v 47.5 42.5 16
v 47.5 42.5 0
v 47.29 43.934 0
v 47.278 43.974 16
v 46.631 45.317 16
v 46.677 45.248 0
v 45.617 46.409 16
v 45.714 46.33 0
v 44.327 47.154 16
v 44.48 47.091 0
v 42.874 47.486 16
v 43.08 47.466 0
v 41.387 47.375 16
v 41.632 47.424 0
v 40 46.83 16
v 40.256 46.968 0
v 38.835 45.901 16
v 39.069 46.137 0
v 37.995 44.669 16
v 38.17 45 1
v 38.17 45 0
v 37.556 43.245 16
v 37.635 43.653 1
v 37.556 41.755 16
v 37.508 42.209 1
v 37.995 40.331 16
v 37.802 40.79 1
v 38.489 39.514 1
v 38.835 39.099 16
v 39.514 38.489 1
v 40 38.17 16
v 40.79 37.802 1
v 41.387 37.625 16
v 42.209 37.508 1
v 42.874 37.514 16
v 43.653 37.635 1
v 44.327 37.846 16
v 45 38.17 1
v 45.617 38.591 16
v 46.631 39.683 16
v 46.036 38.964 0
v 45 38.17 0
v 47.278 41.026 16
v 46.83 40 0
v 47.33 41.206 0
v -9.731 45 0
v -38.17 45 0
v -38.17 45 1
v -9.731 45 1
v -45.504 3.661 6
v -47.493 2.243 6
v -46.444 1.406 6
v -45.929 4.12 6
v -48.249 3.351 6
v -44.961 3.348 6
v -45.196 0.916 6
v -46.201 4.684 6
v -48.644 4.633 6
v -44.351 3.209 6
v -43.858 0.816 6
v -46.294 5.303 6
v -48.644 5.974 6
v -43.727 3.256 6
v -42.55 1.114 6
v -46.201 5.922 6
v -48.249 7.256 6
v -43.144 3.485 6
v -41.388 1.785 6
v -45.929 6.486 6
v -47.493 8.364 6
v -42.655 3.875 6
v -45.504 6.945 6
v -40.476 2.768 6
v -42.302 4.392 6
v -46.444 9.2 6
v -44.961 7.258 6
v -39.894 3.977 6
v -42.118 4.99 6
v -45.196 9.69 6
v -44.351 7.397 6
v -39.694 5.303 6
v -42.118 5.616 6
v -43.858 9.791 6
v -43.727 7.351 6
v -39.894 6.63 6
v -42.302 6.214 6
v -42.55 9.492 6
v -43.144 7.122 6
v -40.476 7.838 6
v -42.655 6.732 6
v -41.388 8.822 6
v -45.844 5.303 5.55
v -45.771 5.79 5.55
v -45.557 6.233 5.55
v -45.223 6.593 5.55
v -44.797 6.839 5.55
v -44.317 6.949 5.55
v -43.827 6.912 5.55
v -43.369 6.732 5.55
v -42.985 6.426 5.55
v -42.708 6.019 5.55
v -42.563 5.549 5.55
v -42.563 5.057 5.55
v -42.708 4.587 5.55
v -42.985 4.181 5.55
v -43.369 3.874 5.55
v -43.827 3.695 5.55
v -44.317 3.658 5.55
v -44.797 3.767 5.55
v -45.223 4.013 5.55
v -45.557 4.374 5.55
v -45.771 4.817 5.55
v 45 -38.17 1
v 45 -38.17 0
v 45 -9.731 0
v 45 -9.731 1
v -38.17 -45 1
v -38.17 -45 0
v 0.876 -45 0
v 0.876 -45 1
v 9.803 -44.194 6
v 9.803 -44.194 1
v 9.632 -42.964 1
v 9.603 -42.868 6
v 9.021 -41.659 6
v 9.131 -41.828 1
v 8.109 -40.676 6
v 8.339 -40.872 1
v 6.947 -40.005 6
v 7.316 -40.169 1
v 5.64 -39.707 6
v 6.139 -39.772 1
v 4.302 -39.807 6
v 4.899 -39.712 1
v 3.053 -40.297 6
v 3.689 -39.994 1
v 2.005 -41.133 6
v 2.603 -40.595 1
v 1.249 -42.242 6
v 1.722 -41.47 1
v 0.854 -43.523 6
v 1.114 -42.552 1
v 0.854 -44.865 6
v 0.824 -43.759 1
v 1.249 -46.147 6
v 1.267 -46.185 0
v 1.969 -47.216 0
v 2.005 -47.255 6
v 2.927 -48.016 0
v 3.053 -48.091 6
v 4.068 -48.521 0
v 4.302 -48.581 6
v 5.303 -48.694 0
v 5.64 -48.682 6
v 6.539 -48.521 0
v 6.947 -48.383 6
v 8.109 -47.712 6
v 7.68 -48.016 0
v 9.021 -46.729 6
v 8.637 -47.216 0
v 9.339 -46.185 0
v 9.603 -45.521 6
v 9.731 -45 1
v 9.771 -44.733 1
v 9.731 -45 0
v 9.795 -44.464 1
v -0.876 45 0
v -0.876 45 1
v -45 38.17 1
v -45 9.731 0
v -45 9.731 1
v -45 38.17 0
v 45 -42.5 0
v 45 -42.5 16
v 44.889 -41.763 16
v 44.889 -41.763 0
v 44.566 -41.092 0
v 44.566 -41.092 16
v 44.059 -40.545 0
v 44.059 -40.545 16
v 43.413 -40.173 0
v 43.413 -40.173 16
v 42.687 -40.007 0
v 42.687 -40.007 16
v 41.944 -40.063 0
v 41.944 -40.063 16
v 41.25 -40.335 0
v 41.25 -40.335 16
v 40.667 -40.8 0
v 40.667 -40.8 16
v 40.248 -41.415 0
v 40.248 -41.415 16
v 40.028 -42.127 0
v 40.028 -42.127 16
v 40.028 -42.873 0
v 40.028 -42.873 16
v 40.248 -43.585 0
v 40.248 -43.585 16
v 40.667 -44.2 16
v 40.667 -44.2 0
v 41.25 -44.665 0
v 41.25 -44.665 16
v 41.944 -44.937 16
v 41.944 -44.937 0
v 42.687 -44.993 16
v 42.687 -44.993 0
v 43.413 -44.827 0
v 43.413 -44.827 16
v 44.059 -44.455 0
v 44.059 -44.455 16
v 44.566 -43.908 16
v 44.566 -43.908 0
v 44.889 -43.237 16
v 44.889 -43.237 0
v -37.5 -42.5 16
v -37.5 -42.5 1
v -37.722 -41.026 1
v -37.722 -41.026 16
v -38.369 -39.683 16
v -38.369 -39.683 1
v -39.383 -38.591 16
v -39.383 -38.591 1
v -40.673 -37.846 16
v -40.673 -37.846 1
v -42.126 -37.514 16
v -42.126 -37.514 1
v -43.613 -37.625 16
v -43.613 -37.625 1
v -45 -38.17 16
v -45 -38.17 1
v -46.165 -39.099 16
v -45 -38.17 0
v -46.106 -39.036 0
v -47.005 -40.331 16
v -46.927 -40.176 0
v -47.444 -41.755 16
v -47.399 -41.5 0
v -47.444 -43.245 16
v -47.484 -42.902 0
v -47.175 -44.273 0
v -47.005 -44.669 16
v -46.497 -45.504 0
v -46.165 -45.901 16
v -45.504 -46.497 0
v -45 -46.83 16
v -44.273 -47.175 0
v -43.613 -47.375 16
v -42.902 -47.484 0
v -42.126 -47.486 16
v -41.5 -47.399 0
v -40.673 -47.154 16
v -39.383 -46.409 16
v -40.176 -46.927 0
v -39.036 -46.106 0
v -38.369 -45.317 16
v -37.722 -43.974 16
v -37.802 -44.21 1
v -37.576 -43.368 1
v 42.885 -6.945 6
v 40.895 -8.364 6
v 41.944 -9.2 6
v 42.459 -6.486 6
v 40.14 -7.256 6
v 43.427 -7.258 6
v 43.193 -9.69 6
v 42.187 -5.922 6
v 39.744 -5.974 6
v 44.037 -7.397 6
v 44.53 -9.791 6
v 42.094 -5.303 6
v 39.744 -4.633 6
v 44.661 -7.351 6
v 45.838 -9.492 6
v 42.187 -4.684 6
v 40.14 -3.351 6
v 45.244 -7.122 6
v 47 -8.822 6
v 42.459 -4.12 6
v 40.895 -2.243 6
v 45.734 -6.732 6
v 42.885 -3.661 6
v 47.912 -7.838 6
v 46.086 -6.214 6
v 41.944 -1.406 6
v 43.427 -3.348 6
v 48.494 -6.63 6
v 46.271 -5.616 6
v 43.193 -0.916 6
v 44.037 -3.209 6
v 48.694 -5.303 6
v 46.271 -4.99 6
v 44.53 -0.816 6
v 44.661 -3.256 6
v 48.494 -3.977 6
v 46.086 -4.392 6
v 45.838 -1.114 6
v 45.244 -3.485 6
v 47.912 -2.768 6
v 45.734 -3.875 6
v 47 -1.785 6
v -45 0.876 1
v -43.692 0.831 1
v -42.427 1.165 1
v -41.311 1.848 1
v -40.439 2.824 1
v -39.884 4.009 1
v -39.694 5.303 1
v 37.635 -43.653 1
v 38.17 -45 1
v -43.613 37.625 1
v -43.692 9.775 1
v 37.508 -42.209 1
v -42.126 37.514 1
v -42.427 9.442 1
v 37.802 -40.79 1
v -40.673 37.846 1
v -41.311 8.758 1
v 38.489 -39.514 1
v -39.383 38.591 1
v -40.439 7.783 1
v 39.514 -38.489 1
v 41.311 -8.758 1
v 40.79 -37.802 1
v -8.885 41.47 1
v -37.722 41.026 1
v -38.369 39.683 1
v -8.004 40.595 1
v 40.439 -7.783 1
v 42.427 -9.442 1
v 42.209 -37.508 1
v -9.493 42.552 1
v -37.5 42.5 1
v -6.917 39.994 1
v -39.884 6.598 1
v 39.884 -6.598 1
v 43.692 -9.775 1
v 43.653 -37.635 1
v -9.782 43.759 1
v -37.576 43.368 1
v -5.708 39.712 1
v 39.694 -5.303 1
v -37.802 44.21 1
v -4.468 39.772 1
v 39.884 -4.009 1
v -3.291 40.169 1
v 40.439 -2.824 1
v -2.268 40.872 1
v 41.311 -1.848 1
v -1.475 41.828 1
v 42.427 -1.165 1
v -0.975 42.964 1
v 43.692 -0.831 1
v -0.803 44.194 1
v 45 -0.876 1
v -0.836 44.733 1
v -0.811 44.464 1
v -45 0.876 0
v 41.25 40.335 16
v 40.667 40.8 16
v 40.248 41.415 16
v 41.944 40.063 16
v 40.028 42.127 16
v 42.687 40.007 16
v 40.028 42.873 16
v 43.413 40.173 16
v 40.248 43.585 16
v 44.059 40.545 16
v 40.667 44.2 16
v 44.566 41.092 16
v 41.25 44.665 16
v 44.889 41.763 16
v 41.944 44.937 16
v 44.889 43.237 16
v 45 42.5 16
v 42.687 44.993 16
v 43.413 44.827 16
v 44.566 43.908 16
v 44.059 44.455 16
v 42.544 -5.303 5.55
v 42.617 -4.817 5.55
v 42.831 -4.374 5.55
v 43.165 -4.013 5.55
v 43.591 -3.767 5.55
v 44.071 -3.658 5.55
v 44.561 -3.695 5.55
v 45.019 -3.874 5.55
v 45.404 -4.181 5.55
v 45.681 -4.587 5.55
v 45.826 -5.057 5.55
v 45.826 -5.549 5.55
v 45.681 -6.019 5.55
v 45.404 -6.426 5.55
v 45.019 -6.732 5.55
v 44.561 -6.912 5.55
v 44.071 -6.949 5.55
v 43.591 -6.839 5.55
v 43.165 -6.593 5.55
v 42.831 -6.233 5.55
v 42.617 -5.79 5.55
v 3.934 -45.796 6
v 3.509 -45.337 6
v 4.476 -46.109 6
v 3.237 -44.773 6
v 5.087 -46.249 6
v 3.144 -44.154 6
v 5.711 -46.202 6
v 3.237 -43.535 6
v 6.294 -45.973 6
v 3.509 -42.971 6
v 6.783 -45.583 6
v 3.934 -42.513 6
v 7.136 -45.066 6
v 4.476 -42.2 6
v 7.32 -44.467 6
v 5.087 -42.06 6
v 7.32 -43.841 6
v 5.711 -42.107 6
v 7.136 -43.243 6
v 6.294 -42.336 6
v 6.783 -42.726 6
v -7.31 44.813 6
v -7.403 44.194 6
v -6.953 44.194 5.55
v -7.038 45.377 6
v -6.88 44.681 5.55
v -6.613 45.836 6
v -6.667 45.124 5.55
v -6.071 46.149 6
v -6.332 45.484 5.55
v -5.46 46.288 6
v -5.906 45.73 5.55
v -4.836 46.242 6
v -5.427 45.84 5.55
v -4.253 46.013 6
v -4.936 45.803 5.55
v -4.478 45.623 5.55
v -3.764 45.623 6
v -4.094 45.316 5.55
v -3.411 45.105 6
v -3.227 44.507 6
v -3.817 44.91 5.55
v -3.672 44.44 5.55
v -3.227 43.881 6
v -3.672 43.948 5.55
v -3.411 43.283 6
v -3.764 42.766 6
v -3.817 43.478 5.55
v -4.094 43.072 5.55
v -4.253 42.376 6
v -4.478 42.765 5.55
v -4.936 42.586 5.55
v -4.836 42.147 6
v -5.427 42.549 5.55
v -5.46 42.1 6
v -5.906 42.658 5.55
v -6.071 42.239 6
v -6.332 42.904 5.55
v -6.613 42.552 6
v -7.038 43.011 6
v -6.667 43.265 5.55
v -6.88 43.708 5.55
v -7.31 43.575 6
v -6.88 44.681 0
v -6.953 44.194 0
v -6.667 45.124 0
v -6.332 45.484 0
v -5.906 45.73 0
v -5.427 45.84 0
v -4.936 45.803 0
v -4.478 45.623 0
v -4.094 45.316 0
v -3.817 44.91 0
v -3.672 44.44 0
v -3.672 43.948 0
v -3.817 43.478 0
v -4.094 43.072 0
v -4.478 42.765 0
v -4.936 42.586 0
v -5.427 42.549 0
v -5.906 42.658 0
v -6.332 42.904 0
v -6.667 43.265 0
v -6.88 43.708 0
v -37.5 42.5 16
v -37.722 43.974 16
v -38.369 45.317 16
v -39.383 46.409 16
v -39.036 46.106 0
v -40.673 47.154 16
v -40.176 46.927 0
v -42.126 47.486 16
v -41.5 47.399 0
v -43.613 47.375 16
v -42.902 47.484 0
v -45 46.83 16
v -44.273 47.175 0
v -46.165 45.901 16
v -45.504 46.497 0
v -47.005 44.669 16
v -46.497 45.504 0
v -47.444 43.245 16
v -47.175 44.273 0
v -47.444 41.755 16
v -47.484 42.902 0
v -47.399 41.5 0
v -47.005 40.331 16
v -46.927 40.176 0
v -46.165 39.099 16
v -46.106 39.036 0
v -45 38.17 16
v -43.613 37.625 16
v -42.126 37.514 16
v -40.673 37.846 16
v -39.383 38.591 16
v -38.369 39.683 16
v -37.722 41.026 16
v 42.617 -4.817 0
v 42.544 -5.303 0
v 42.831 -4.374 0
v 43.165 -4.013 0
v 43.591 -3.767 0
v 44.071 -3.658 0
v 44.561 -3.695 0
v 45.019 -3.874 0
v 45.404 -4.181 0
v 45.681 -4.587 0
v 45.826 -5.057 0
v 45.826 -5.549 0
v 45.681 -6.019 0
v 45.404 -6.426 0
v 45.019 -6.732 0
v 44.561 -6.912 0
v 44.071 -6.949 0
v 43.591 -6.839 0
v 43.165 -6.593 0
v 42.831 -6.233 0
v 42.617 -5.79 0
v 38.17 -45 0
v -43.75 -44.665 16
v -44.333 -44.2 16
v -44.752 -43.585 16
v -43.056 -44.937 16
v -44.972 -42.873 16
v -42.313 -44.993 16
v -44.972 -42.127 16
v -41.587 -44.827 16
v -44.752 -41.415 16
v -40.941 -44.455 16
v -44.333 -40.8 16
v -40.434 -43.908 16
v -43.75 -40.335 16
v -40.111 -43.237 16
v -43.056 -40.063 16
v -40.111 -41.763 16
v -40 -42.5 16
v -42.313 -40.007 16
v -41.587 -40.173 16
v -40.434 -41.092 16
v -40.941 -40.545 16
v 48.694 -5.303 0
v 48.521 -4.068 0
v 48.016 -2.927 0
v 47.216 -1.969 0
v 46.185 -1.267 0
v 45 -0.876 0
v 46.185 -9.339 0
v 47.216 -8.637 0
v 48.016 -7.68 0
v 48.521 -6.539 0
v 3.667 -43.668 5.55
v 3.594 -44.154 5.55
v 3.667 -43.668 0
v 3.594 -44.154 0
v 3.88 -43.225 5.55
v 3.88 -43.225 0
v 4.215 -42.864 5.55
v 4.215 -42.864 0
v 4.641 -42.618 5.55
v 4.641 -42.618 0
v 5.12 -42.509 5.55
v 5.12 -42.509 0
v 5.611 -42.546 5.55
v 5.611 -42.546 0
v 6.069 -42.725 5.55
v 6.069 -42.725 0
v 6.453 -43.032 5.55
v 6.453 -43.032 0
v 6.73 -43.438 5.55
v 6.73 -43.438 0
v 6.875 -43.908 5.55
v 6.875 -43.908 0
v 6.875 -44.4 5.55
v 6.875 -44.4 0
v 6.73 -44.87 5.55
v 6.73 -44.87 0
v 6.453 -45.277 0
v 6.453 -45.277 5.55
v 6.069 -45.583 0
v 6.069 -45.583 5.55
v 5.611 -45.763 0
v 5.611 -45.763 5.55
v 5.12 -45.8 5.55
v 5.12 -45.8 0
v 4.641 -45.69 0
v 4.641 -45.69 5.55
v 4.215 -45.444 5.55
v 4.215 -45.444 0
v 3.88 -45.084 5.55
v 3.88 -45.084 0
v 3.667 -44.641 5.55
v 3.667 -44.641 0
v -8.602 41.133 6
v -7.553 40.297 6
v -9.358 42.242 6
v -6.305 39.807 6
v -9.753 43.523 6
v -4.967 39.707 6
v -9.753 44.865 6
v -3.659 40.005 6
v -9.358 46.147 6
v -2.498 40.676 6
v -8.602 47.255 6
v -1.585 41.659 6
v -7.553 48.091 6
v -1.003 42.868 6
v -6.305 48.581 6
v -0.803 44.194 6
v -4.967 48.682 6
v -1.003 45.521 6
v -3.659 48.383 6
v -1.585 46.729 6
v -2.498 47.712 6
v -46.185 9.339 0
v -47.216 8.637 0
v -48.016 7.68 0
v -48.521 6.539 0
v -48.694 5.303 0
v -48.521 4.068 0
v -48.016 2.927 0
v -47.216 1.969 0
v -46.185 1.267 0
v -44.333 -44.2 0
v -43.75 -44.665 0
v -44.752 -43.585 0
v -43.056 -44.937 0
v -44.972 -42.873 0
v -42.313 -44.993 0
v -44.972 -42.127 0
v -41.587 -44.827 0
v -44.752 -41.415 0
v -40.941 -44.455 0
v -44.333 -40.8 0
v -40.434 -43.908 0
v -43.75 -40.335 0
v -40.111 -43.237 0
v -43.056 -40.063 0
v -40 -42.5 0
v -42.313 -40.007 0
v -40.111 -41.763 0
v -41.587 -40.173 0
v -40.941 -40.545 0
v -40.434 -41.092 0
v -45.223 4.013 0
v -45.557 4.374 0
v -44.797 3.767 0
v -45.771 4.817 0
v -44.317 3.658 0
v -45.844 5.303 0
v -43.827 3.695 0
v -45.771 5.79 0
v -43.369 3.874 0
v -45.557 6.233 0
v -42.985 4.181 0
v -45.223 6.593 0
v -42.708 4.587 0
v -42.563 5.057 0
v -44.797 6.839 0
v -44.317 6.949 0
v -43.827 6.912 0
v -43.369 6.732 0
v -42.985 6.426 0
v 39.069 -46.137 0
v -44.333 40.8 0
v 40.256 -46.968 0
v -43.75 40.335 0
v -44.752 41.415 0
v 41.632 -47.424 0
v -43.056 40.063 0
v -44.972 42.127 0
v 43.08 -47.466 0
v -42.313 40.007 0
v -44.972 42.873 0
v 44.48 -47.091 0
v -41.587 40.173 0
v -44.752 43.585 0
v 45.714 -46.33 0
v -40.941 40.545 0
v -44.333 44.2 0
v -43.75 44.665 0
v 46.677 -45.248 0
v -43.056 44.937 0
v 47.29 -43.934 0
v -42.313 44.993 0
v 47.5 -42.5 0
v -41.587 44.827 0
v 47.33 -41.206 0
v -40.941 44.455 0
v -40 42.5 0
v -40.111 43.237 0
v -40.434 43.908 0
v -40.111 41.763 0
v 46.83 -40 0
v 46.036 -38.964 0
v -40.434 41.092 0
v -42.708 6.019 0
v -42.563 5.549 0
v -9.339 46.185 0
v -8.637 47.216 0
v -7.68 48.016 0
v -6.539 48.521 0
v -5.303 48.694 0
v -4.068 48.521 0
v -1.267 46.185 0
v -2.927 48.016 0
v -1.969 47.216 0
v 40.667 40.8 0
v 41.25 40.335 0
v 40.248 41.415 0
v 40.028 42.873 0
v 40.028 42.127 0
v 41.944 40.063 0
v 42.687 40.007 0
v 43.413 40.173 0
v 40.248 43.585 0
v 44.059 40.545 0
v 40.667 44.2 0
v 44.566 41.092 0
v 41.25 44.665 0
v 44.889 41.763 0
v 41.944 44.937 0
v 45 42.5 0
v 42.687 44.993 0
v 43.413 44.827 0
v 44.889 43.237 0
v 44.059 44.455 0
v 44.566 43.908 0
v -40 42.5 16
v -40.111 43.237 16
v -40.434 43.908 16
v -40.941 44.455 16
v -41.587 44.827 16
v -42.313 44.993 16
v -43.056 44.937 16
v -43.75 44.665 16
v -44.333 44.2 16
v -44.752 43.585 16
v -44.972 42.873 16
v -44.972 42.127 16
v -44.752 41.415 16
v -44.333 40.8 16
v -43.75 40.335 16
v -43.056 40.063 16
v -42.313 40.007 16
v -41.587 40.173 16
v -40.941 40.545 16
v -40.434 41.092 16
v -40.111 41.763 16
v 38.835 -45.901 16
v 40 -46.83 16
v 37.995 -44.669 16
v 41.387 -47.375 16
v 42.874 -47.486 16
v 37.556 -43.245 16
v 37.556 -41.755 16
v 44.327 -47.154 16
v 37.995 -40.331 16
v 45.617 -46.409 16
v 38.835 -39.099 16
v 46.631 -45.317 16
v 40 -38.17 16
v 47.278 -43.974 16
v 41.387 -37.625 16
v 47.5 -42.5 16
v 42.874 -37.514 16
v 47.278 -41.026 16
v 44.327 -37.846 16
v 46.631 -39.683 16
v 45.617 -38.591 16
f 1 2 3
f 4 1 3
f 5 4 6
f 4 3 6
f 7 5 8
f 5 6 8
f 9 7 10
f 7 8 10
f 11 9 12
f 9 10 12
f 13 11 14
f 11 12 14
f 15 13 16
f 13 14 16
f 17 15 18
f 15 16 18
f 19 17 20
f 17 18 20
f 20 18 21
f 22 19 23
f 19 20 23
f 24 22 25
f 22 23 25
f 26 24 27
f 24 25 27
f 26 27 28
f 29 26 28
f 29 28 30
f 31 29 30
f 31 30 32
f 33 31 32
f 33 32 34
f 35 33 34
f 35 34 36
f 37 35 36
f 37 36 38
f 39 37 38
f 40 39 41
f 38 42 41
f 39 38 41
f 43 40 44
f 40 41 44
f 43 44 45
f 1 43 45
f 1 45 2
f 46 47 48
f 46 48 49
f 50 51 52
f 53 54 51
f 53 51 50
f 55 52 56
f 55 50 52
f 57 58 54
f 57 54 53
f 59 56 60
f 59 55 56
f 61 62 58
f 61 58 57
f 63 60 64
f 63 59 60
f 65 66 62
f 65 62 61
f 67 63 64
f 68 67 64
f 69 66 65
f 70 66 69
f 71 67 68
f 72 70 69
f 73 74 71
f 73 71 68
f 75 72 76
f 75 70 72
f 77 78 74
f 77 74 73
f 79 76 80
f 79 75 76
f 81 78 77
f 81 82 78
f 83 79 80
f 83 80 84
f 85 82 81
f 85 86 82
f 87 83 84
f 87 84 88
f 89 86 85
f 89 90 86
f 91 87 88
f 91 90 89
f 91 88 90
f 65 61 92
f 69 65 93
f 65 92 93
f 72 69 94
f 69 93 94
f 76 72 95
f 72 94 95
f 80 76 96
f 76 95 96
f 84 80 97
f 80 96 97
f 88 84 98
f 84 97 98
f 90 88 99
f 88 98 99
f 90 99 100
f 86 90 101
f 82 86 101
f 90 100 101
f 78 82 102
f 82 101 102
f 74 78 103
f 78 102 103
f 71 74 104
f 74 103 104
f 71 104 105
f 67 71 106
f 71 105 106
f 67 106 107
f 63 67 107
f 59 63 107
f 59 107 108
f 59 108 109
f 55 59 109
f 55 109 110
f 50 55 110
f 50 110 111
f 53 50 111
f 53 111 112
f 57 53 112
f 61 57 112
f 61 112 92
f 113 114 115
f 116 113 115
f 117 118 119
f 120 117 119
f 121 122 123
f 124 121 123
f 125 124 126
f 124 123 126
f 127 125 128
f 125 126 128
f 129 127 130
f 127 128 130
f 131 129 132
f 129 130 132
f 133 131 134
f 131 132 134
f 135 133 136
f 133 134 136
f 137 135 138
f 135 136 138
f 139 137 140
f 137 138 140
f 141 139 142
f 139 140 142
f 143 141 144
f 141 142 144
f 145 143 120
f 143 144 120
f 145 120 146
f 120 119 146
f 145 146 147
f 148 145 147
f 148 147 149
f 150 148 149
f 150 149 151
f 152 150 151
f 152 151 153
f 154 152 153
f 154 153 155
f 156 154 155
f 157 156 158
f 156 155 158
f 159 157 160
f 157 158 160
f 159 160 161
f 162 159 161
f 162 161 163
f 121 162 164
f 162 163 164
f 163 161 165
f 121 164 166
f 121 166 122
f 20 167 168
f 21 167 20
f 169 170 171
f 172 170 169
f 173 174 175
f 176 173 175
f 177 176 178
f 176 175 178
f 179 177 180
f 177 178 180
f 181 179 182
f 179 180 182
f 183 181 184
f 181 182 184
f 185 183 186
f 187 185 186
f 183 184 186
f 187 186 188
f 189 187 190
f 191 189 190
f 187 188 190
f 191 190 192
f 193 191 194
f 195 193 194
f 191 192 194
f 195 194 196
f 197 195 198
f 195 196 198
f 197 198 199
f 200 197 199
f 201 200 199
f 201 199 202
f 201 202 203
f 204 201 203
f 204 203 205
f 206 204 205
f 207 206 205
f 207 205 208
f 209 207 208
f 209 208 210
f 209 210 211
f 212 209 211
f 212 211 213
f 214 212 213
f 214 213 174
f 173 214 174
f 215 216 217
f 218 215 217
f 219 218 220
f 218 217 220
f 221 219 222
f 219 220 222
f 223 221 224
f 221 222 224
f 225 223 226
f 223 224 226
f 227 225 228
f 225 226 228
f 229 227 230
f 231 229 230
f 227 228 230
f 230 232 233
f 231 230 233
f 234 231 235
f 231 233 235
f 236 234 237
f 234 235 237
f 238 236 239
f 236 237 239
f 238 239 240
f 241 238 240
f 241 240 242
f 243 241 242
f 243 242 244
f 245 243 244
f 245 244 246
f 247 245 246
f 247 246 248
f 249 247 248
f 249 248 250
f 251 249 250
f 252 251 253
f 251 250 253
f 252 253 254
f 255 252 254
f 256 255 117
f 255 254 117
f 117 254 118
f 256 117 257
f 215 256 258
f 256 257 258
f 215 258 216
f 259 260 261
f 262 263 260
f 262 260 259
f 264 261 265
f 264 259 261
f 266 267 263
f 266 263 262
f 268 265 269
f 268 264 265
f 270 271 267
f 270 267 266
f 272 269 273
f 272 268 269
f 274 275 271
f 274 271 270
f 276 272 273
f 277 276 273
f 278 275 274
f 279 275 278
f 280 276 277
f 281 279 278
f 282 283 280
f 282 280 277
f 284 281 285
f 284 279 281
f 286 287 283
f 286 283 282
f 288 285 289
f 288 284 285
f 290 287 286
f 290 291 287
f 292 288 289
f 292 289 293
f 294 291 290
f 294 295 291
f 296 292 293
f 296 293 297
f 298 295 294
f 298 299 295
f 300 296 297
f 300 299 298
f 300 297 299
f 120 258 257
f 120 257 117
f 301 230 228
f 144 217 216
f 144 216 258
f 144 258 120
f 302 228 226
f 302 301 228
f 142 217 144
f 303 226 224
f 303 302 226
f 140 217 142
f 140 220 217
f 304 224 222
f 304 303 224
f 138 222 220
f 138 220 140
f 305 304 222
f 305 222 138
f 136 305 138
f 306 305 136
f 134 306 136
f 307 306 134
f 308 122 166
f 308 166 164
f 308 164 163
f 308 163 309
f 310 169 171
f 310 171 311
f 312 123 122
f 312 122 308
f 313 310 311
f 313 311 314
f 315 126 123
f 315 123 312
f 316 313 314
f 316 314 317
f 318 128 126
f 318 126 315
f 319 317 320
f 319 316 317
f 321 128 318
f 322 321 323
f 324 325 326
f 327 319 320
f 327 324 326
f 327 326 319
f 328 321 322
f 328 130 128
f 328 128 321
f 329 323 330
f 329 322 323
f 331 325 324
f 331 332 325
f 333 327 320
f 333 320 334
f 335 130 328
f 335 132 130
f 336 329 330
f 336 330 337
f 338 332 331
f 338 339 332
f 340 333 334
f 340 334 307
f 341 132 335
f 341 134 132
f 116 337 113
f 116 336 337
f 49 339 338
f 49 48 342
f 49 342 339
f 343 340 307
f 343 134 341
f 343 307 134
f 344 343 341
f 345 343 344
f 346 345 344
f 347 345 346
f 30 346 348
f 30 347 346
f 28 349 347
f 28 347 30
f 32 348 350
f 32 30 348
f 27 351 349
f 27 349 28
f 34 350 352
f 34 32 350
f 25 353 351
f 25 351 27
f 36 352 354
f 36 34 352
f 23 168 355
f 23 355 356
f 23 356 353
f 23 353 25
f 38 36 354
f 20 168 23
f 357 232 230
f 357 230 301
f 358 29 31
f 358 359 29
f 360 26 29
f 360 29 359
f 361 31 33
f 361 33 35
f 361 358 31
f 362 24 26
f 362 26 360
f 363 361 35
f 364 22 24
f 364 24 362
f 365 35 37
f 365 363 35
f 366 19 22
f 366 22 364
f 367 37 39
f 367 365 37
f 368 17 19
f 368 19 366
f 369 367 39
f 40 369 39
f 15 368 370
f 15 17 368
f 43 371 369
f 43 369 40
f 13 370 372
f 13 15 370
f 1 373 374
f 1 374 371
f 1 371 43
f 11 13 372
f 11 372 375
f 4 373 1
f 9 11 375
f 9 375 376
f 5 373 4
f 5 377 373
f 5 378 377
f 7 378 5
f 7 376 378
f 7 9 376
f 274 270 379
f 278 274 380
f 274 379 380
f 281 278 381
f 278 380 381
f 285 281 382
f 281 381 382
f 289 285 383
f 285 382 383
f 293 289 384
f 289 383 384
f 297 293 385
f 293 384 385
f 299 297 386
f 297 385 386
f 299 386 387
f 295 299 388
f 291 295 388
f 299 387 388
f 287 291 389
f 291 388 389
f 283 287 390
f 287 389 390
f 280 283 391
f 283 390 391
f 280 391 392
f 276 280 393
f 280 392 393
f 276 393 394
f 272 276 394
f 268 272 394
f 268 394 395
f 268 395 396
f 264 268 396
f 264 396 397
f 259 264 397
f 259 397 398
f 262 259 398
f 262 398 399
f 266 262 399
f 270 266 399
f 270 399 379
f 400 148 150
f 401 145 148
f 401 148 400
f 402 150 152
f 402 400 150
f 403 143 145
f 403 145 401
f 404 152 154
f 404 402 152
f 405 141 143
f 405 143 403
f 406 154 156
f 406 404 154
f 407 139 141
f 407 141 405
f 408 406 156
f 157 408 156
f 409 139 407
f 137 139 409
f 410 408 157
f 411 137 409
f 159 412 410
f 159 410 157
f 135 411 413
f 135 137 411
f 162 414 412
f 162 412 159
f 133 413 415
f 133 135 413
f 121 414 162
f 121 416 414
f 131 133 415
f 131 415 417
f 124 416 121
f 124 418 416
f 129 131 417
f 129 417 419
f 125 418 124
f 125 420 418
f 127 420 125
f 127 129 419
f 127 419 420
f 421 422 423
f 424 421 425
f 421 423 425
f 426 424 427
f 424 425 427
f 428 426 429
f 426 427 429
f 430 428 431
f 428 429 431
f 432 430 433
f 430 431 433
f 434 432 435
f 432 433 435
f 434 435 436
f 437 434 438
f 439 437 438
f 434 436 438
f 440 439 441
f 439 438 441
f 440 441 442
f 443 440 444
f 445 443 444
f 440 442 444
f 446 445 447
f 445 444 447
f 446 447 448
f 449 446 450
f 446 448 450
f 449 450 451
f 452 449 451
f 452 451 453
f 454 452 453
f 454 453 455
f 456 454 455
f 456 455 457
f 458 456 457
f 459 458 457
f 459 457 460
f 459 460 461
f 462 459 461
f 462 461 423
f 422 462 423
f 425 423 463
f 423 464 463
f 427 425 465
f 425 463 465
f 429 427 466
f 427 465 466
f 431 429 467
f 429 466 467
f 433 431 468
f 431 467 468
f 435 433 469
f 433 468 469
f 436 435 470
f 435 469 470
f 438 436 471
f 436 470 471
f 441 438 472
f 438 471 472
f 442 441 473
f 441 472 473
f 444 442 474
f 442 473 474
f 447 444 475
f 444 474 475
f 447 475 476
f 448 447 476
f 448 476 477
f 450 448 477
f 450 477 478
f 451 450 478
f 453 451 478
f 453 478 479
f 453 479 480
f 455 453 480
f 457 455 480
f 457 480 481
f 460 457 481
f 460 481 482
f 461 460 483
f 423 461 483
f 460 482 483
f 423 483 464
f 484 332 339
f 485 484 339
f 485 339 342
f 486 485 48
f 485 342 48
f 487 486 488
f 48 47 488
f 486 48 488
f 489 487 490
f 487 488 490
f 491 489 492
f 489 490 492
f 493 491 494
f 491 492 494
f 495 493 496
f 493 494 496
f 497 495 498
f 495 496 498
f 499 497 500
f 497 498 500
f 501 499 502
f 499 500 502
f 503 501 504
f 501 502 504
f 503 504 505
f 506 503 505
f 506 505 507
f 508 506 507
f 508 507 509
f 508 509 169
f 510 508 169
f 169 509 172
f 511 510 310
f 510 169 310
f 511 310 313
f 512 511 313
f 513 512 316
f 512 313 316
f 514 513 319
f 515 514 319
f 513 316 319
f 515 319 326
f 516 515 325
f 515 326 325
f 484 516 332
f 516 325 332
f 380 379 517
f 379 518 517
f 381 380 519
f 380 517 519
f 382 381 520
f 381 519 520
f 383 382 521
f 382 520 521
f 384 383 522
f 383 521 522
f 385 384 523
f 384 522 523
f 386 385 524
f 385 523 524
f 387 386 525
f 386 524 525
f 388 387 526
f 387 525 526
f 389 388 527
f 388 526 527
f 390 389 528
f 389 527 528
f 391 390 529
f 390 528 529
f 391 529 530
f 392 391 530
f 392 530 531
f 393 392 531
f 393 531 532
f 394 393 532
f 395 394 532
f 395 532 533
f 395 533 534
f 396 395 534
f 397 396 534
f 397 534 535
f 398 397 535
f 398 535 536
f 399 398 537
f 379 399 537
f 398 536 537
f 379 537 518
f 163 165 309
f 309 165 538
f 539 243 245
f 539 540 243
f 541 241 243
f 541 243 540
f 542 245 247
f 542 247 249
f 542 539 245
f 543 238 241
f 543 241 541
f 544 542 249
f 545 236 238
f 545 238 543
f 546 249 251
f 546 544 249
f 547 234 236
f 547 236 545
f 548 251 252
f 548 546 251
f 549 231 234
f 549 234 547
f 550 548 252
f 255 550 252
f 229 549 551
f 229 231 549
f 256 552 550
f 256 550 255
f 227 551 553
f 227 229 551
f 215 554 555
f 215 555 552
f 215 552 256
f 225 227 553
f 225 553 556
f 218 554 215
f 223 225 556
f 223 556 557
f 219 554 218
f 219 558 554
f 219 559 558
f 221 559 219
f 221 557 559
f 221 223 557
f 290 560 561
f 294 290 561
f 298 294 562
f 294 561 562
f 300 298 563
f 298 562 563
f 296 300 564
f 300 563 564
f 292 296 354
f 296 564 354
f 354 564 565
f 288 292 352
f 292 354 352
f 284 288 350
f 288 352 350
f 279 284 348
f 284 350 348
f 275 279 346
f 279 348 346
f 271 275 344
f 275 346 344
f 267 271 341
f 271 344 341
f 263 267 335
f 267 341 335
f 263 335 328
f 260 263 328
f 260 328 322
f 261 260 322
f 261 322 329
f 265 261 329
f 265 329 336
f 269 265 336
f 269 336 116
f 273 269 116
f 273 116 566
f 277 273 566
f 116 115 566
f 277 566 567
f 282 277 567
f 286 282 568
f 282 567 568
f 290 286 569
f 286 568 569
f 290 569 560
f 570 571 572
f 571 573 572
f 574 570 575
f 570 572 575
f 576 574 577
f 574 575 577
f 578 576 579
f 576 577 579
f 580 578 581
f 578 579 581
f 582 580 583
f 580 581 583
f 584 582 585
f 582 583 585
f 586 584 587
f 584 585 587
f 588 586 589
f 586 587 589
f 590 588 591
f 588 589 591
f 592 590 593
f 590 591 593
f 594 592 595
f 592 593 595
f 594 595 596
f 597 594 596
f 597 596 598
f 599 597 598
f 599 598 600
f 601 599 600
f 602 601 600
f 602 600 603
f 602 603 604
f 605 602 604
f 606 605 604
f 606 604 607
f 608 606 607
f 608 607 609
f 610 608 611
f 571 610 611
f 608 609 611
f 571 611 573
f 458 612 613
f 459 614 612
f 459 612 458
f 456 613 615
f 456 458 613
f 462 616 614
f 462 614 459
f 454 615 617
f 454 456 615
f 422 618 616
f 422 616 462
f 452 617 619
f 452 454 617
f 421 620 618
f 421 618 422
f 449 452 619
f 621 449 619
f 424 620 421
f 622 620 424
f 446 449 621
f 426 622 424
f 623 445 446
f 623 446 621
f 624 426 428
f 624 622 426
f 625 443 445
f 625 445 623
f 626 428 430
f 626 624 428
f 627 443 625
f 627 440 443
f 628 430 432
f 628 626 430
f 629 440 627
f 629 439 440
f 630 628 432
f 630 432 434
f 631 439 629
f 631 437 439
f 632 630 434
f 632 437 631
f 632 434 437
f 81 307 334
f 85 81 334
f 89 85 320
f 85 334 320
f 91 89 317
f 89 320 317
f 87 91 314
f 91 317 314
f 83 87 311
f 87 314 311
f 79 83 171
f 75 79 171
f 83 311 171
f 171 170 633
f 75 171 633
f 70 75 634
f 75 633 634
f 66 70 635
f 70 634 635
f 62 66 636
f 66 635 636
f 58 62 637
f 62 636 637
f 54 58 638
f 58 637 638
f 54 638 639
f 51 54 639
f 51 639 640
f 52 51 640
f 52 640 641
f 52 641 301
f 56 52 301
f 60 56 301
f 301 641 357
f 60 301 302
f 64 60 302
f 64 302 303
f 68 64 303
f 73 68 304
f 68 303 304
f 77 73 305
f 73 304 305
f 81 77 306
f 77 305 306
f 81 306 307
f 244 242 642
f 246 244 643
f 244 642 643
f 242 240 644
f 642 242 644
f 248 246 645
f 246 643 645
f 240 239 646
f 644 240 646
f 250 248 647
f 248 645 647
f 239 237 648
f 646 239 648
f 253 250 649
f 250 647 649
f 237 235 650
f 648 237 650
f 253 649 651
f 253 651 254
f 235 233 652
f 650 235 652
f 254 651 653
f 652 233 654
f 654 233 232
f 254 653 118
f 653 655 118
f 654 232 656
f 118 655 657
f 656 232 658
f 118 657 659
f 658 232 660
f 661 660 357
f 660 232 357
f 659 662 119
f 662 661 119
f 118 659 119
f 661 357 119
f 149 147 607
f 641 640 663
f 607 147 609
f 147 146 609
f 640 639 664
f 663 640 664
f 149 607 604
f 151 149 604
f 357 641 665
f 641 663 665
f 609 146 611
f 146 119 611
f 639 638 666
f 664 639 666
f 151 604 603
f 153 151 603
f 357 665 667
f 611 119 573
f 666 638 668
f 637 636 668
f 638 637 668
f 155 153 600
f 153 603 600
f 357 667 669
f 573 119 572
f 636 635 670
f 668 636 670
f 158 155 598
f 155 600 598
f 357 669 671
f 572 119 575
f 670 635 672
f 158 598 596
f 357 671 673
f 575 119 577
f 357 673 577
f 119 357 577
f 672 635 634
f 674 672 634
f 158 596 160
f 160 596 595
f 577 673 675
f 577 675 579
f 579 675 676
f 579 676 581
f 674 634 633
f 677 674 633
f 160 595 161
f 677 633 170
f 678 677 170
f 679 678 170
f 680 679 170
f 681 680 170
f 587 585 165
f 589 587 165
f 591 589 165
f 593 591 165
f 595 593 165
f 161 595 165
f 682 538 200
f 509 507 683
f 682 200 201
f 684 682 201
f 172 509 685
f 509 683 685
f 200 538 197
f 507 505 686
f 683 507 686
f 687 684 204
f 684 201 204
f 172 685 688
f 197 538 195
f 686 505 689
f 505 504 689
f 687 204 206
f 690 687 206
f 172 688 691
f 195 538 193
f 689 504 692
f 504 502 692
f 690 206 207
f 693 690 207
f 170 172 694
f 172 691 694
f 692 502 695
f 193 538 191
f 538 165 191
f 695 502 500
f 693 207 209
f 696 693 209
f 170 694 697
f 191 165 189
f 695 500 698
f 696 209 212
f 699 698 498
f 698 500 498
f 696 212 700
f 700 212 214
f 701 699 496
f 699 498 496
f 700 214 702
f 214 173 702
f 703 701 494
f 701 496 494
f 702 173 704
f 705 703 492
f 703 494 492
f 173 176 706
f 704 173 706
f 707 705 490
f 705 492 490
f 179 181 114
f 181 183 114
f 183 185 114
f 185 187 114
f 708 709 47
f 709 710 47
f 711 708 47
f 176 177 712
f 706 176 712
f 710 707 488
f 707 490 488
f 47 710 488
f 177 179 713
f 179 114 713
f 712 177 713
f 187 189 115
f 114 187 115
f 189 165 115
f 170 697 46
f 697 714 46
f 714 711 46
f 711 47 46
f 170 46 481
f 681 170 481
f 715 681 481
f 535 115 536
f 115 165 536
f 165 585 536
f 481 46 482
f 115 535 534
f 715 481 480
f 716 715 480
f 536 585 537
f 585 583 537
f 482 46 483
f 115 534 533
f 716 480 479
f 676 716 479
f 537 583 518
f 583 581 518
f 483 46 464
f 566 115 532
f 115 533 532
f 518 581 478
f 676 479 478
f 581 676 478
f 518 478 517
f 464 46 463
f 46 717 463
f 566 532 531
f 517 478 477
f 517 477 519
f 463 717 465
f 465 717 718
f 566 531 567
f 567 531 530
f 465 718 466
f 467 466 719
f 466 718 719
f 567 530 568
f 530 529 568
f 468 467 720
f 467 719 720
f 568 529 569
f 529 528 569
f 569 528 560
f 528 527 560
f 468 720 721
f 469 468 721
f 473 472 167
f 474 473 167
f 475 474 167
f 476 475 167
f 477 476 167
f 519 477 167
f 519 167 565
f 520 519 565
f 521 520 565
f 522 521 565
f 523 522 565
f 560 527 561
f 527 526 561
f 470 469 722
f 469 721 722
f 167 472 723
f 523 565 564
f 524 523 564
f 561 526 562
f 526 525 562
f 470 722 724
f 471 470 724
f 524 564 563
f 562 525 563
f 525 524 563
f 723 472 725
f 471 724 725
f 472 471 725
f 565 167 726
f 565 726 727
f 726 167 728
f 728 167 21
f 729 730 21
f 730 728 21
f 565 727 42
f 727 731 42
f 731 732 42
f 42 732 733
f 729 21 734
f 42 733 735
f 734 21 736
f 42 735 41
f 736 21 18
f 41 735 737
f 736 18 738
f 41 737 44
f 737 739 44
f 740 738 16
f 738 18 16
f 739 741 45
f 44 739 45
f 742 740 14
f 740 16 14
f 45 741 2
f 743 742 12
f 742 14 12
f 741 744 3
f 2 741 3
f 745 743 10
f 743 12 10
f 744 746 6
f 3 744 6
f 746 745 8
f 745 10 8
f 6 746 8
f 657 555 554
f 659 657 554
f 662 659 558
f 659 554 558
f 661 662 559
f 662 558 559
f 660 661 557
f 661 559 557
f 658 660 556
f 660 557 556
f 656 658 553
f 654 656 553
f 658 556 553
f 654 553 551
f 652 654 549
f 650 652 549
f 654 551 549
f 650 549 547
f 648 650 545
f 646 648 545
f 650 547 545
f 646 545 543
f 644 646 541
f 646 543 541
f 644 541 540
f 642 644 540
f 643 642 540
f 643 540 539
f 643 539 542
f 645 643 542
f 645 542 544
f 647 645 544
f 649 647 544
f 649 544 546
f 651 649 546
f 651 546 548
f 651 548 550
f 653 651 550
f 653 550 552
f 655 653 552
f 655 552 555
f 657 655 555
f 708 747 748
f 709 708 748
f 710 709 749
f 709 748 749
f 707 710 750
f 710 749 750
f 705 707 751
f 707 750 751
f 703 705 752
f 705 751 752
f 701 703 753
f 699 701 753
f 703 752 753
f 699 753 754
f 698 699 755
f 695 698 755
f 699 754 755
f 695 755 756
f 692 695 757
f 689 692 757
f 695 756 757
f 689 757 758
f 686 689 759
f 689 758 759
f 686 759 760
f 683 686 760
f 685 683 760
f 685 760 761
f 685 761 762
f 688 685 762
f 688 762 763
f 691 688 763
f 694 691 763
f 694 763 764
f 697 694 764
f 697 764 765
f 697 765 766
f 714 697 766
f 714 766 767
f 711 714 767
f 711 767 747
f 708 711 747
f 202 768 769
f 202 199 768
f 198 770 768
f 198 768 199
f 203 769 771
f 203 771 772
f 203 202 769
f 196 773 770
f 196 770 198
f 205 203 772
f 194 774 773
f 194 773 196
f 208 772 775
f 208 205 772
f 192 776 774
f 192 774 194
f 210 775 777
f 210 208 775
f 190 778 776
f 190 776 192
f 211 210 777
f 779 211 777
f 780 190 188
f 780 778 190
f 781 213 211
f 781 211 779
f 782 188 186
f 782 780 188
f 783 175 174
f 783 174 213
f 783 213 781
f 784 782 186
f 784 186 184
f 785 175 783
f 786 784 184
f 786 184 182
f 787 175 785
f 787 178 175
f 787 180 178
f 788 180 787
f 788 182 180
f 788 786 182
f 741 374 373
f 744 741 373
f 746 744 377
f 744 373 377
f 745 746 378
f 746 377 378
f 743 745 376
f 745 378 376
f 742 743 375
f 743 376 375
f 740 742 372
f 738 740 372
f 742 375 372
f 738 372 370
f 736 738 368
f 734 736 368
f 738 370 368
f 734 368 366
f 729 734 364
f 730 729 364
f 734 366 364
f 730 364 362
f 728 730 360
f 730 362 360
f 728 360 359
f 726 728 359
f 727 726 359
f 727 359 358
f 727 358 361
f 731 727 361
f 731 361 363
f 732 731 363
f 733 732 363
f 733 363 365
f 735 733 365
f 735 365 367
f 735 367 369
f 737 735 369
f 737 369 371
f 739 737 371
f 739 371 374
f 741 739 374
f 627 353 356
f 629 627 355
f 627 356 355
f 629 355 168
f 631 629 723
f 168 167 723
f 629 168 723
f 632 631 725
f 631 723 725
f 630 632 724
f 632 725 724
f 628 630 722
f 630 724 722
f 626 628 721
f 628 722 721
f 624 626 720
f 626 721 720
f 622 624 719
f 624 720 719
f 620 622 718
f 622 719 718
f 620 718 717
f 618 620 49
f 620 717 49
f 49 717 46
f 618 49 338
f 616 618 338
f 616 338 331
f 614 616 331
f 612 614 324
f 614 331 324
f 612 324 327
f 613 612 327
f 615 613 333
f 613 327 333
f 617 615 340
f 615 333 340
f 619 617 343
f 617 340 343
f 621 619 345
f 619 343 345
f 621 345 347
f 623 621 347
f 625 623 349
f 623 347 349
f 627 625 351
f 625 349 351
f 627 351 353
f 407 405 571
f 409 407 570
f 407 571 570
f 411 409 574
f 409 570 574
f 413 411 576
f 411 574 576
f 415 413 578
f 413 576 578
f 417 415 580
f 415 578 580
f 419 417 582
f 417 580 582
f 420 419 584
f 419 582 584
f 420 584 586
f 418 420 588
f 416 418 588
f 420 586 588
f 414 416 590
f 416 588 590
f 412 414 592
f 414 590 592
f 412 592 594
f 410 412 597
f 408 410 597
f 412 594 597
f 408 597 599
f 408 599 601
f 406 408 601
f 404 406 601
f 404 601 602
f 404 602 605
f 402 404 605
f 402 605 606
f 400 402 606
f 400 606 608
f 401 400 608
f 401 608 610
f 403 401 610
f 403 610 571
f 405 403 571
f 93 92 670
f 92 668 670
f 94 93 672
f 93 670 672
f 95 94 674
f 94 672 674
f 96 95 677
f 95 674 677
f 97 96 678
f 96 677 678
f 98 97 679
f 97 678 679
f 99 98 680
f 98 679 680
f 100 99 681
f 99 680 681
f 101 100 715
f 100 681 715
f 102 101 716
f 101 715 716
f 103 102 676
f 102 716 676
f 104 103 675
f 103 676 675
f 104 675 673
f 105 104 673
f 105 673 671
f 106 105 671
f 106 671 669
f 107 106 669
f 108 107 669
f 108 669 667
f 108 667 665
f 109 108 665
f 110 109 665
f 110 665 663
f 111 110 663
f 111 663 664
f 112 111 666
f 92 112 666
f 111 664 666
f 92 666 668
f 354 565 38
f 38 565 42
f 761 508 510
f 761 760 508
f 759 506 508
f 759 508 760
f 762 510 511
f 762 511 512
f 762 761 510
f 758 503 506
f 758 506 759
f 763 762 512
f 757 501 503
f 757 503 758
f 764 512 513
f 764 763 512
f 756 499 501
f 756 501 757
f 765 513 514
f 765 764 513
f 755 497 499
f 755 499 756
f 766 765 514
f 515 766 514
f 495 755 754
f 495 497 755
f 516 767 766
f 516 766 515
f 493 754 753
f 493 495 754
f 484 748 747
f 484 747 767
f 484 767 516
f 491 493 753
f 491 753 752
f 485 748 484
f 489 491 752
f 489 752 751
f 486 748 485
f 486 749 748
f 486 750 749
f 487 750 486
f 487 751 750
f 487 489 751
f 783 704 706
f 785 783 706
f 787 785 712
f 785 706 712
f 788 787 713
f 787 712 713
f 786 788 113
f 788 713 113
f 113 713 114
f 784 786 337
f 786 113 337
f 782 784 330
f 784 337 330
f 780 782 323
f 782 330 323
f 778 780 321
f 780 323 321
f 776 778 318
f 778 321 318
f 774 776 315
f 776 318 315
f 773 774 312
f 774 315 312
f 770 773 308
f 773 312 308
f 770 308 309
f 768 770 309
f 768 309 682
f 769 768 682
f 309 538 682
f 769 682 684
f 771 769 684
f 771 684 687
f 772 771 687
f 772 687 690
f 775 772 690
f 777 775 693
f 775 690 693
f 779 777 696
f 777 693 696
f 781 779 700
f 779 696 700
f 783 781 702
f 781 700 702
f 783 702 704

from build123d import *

# Parameters (mm, degrees)
SKIZZE1_W                                            = 90
SKIZZE1_H                                            = 90
AUFSATZ_LINEAR_AUSTRAGEN1_DEPTH                      = 1
AUFSATZ_LINEAR_START                                 = -1
SKIZZE12_R                                           = 5
AUFSATZ_LINEAR_AUSTRAGEN2_DEPTH                      = 16
SKIZZE13_R                                           = 2.5
SCHNITT_LINEAR_AUSTRAGEN6_DEPTH                      = 100
LINEARES_MUSTER1_COUNT                               = 2
LINEARES_MUSTER1_PITCH                               = 85
LINEARES_MUSTER1_COUNT_DIR2                          = 2
LINEARES_MUSTER1_PITCH_DIR2                          = 85
AUFSATZ_LINEAR_AUSTRAGEN3_DEPTH                      = 5
AUFSATZ_LINEAR_AUSTRAGEN3_DEPTH_BACK                 = 1
SKIZZE16_R                                           = 4.5
FORMSENKUNG_F_R_M3_LINSENSENKSCHRAUBE_MI_D           = 3.3
FORMSENKUNG_F_R_M3_LINSENSENKSCHRAUBE_MI_DEPTH       = 20
FORMSENKUNG_F_R_M3_LINSENSENKSCHRAUBE_MI_CSINK_D     = 4.2
FORMSENKUNG_F_R_M3_LINSENSENKSCHRAUBE_MI_CSINK_ANGLE = 90
FORMSENKUNG_F_R_M3_LINSENSENKSCHRAUBE_MI_TIP         = 0.991420021


with BuildPart() as part:
    # Skizze1 → Aufsatz-Linear austragen1 (new body)
    with BuildSketch(Plane.XY):
        Rectangle(SKIZZE1_W, SKIZZE1_H)
    extrude(amount=AUFSATZ_LINEAR_AUSTRAGEN1_DEPTH)

    # Skizze12 → Aufsatz-Linear austragen2 (add)
    with BuildSketch(Plane.XY.offset(1).offset(AUFSATZ_LINEAR_START)):
        with Locations((-42.5, 42.5)):
            Circle(SKIZZE12_R)
    aufsatz_linear_austragen2 = extrude(amount=AUFSATZ_LINEAR_AUSTRAGEN2_DEPTH)

    # Skizze13 → Schnitt-Linear austragen6 (cut)
    with BuildSketch(Plane.XY.offset(16)):
        with Locations((-42.5, 42.5)):
            Circle(SKIZZE13_R)
    schnitt_linear_austragen6 = extrude(amount=-SCHNITT_LINEAR_AUSTRAGEN6_DEPTH, mode=Mode.SUBTRACT)

    # Lineares Muster1: Aufsatz-Linear austragen2, Schnitt-Linear austragen6 2 × 2
    with Locations(*[(i * LINEARES_MUSTER1_PITCH, -j * LINEARES_MUSTER1_PITCH_DIR2, 0) for i in range(LINEARES_MUSTER1_COUNT) for j in range(LINEARES_MUSTER1_COUNT_DIR2) if (i, j) != (0, 0)]):
        add(aufsatz_linear_austragen2)
        add(schnitt_linear_austragen6, mode=Mode.SUBTRACT)

    # Skizze16 → Aufsatz-Linear austragen3 (add, two sides: drawn at the far end of the back side and taken through both)
    with BuildSketch(Plane.XY.offset(1).offset(-AUFSATZ_LINEAR_AUSTRAGEN3_DEPTH_BACK)):
        with Locations((44.194173824, -5.303300859)):
            Circle(SKIZZE16_R)
        with Locations((5.303300859, -44.194173824)):
            Circle(SKIZZE16_R)
        with Locations((-44.194173824, 5.303300859)):
            Circle(SKIZZE16_R)
        with Locations((-5.303300859, 44.194173824)):
            Circle(SKIZZE16_R)
    extrude(amount=AUFSATZ_LINEAR_AUSTRAGEN3_DEPTH + AUFSATZ_LINEAR_AUSTRAGEN3_DEPTH_BACK)

    # Formsenkung für M3 Linsensenkschraube mit Schlitz1
    with Locations(Plane.XY.offset(6)):
        with Locations((5.243612969, -44.154400898), (44.194173824, -5.303300859), (-5.303300859, 44.194173824), (-44.194173824, 5.303300859)):
            CounterSinkHole(FORMSENKUNG_F_R_M3_LINSENSENKSCHRAUBE_MI_D / 2, FORMSENKUNG_F_R_M3_LINSENSENKSCHRAUBE_MI_CSINK_D / 2, depth=FORMSENKUNG_F_R_M3_LINSENSENKSCHRAUBE_MI_DEPTH, counter_sink_angle=FORMSENKUNG_F_R_M3_LINSENSENKSCHRAUBE_MI_CSINK_ANGLE)
            with Locations((0, 0, -(FORMSENKUNG_F_R_M3_LINSENSENKSCHRAUBE_MI_DEPTH + FORMSENKUNG_F_R_M3_LINSENSENKSCHRAUBE_MI_TIP / 2))):  # 118° drill point
                Cone(0, FORMSENKUNG_F_R_M3_LINSENSENKSCHRAUBE_MI_D / 2, FORMSENKUNG_F_R_M3_LINSENSENKSCHRAUBE_MI_TIP, mode=Mode.SUBTRACT)


solid = part.part
